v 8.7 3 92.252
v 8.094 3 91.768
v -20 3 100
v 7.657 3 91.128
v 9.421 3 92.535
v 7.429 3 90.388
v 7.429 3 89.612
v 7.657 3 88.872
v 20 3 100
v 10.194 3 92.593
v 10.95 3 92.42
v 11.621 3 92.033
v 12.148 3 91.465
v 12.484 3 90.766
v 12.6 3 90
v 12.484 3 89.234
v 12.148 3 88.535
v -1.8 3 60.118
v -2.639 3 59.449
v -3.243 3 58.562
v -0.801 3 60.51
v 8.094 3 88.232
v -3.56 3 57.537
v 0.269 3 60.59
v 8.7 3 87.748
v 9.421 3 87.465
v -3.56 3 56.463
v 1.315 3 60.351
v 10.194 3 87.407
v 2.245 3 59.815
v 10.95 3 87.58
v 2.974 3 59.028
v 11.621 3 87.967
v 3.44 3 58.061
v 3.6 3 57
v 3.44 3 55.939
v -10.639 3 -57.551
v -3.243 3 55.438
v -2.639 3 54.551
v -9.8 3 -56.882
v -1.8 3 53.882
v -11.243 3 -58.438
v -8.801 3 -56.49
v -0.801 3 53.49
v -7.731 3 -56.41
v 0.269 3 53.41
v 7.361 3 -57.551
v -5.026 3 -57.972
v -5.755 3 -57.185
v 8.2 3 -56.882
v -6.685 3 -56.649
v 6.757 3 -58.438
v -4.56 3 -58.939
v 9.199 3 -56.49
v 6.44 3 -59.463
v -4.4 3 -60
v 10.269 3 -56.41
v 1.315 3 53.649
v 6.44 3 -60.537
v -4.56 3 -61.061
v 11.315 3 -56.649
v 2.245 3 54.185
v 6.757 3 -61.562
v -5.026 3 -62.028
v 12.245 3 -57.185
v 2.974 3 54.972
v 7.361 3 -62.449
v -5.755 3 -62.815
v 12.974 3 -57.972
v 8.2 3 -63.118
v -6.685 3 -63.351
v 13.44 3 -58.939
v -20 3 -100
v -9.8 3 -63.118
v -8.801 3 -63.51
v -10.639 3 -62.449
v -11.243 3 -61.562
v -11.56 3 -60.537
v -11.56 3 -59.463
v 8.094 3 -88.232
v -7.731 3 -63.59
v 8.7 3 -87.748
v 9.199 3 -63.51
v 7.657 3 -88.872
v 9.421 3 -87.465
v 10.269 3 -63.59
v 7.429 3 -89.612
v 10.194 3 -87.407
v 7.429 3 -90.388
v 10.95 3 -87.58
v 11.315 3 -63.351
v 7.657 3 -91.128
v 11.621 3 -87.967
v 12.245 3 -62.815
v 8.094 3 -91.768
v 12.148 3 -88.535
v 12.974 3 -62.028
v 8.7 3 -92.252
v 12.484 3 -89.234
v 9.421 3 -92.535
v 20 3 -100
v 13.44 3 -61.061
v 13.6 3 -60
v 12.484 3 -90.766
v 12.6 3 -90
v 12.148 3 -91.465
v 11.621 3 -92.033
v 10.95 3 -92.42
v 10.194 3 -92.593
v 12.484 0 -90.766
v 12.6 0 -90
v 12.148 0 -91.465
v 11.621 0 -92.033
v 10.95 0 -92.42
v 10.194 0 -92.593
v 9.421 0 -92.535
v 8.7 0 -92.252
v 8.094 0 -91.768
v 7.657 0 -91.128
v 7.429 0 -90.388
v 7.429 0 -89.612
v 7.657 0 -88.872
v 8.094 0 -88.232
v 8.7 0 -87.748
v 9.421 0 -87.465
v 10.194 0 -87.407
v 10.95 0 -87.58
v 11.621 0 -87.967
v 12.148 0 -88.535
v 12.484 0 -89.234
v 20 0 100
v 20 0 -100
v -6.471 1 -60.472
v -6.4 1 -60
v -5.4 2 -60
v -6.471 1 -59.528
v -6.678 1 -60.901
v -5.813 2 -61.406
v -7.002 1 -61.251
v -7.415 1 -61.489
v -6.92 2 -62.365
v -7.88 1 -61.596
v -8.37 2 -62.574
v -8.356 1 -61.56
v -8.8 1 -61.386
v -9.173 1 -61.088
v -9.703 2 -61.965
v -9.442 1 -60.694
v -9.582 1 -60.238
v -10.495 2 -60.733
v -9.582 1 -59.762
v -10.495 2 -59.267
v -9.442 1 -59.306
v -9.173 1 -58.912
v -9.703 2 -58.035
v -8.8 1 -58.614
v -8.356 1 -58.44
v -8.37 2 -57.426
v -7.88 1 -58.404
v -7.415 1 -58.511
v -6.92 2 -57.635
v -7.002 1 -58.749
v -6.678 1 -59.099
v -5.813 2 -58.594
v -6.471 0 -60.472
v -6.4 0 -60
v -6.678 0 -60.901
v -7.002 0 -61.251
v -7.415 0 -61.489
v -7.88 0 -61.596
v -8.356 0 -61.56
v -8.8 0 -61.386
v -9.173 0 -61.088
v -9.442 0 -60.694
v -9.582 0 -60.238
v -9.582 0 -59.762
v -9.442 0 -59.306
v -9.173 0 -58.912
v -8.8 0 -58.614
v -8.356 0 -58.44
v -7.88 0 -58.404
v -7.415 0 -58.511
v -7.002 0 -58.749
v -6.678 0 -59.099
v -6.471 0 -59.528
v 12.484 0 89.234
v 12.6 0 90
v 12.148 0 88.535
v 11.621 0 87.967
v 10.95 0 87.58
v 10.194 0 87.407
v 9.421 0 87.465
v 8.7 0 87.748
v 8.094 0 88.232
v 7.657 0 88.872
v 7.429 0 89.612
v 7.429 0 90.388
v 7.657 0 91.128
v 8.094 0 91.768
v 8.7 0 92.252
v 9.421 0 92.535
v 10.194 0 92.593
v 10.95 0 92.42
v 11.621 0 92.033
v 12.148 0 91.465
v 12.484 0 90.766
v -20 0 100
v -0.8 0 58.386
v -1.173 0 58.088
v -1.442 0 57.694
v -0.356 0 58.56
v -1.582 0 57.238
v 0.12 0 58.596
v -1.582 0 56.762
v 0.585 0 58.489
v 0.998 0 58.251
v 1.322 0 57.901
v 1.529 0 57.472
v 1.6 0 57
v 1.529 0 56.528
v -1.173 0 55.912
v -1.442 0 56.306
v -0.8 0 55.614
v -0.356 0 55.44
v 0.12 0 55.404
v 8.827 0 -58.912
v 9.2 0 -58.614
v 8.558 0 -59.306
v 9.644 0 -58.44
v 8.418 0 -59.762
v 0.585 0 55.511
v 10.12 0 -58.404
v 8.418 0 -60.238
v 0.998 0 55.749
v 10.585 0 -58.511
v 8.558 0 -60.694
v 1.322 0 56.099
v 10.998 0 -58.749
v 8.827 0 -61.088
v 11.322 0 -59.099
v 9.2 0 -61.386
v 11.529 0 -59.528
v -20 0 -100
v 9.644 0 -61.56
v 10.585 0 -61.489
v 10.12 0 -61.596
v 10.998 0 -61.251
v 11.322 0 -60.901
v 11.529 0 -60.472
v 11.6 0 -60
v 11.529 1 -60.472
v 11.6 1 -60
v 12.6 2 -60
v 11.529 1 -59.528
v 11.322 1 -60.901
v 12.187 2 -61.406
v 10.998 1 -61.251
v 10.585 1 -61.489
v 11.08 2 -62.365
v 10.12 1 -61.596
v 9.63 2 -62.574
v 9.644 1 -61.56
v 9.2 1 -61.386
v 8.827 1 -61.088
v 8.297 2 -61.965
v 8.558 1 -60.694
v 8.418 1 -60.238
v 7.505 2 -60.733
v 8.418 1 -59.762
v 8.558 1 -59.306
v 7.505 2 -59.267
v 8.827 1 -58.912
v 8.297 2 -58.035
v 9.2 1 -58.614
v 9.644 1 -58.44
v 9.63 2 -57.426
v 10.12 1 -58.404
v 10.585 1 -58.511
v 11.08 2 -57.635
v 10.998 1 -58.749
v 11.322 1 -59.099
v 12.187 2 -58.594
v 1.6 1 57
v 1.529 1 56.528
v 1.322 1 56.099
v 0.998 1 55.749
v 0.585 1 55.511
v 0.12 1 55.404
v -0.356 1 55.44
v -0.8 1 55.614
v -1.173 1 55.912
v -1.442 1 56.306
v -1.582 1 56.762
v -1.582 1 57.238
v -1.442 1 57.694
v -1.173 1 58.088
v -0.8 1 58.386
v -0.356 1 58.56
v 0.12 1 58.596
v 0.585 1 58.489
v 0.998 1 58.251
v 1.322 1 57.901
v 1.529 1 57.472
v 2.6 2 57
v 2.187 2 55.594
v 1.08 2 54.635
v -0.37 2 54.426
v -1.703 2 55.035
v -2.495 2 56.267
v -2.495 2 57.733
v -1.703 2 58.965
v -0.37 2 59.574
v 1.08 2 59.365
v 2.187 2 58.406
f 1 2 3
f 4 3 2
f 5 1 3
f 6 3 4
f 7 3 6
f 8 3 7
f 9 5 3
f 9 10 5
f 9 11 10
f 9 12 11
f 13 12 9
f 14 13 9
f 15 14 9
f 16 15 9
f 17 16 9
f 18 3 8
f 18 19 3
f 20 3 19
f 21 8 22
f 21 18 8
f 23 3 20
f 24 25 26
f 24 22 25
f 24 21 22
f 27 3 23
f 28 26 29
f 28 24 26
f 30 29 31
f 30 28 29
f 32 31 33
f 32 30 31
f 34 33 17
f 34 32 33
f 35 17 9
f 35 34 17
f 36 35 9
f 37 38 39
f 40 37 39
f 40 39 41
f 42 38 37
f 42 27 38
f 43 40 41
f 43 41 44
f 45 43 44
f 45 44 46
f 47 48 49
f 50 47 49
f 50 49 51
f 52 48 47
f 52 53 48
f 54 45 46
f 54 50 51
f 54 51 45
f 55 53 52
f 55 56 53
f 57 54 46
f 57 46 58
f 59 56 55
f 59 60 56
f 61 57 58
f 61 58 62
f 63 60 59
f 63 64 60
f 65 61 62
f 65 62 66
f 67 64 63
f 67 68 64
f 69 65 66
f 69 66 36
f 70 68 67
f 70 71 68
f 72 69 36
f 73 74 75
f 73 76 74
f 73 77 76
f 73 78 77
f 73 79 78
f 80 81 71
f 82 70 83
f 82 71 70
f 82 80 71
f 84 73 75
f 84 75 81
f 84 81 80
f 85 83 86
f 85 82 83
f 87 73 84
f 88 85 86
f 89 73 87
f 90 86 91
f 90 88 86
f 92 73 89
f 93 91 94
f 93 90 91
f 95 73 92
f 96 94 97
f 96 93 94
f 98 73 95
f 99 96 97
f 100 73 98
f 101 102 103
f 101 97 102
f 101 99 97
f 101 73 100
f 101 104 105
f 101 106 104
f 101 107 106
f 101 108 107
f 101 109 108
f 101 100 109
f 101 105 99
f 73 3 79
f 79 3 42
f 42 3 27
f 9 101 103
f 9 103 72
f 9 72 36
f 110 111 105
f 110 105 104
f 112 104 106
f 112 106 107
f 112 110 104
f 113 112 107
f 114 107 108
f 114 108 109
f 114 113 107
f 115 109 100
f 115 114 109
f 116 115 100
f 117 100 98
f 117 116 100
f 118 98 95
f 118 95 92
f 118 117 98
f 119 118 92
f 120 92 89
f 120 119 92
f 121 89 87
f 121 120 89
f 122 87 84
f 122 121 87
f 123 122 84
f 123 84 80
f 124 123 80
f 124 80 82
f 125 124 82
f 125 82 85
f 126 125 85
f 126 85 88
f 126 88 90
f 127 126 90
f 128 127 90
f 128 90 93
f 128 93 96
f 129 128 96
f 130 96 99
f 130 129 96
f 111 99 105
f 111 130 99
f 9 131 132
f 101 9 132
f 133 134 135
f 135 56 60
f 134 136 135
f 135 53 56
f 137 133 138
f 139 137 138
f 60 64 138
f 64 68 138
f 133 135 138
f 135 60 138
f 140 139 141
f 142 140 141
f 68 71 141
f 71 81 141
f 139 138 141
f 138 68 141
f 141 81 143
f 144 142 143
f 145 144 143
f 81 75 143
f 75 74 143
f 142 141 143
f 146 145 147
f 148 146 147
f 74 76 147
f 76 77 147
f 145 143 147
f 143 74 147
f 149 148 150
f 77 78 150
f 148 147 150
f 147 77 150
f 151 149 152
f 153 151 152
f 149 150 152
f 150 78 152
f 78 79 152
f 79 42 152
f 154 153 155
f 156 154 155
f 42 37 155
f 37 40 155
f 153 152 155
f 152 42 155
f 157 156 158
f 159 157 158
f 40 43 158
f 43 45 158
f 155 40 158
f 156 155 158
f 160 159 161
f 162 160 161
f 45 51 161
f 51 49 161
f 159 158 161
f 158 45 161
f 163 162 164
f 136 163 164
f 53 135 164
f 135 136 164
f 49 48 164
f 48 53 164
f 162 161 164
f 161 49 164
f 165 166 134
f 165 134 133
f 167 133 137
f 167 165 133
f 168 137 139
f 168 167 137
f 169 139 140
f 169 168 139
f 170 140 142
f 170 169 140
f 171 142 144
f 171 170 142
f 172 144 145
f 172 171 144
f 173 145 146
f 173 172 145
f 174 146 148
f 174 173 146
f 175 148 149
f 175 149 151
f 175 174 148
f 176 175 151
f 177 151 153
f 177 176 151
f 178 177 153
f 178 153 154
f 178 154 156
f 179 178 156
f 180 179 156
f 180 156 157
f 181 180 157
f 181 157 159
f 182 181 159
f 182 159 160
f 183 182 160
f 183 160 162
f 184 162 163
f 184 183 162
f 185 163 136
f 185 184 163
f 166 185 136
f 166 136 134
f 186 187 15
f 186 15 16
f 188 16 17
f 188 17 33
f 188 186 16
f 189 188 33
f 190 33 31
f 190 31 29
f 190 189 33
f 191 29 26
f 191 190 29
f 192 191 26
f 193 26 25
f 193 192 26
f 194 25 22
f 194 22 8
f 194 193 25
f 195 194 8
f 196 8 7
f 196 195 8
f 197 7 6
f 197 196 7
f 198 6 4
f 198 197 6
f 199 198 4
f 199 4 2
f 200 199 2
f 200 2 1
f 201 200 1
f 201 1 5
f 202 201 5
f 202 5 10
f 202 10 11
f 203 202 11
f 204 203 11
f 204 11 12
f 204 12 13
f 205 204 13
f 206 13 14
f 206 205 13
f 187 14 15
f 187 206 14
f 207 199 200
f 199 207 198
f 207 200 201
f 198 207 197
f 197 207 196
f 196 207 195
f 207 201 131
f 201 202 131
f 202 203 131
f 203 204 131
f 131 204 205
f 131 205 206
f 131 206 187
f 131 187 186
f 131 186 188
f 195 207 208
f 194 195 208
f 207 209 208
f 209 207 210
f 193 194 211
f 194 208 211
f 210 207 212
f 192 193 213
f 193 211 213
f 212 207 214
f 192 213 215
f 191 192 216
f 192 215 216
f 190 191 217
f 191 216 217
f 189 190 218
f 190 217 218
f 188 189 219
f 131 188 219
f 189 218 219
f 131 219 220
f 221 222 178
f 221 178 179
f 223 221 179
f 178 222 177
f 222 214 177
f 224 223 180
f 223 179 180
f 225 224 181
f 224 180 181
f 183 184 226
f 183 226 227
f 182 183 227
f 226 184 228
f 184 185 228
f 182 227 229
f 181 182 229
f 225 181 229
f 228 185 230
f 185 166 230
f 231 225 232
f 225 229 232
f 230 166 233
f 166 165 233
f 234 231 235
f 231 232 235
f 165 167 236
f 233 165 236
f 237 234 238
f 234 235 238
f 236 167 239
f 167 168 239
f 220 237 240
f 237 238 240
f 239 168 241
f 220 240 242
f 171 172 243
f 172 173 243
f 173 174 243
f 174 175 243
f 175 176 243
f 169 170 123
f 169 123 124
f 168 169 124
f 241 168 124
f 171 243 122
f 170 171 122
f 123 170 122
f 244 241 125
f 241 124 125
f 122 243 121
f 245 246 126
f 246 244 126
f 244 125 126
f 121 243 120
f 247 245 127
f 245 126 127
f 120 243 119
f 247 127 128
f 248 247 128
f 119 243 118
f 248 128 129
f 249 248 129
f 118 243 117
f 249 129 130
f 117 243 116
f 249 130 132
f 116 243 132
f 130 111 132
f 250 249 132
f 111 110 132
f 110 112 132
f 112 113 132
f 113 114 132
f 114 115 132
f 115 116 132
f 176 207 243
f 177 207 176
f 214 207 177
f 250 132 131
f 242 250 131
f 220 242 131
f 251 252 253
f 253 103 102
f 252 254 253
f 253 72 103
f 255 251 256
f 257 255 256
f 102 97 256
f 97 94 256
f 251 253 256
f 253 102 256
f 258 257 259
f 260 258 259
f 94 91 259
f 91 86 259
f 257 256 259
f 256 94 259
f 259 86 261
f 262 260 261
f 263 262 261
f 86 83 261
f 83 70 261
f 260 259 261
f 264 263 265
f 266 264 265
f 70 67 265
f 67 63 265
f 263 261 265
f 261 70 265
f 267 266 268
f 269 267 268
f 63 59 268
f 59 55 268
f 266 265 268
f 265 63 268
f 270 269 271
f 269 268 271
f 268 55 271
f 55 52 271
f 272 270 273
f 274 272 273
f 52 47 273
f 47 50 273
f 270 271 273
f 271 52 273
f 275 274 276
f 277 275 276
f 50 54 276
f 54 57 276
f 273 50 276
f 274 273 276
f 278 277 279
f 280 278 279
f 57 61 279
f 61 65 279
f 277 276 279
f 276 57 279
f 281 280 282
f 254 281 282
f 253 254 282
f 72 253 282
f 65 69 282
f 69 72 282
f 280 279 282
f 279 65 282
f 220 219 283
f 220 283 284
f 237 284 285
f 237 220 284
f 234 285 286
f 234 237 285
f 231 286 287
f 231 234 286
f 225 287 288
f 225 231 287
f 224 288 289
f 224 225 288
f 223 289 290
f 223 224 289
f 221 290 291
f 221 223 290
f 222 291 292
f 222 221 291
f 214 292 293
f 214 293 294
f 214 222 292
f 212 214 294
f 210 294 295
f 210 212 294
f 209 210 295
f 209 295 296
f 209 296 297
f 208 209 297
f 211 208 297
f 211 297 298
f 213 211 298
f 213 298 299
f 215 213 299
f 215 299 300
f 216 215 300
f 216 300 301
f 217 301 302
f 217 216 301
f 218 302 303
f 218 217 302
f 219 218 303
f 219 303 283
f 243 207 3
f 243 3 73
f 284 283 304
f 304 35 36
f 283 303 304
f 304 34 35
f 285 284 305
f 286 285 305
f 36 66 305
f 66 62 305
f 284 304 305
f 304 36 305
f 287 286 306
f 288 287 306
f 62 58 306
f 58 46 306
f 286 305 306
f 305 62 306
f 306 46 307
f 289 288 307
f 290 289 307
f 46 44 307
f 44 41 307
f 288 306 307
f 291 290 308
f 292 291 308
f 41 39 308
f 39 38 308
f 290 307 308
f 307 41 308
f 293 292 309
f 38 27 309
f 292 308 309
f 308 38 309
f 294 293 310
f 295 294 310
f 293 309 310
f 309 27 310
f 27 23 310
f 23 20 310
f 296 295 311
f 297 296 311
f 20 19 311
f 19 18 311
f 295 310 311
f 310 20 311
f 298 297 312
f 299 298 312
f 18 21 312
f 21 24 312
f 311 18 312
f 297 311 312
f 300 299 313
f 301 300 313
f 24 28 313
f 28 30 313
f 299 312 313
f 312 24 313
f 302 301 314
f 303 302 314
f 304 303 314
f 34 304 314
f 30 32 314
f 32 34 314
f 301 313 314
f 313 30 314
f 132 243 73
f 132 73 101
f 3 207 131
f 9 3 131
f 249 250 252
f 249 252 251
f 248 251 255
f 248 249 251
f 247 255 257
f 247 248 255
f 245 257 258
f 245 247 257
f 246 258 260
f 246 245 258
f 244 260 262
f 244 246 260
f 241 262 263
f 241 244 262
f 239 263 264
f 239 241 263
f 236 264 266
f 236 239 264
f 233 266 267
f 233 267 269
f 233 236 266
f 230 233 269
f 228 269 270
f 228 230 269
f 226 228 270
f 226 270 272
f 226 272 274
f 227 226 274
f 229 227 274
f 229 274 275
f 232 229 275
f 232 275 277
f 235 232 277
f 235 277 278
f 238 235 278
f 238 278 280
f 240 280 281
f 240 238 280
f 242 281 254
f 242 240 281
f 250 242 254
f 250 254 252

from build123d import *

# Parameters (mm, degrees)
SKETCH1_W           = 40
SKETCH1_H           = 200
SKETCH1_R           = 2.6
SKETCH1_R_2         = 1.6
BOSS_EXTRUDE1_DEPTH = 3
CHAMFER1_SIZE       = 2


with BuildPart() as part:
    # Sketch1 → Boss-Extrude1 (new body)
    with BuildSketch(Plane(origin=(0, 0, 0), x_dir=(1, 0, 0), z_dir=(0, 1, 0))):
        Rectangle(SKETCH1_W, SKETCH1_H)
        with Locations((10, -90)):
            Circle(SKETCH1_R, mode=Mode.SUBTRACT)
        with Locations((10, 90)):
            Circle(SKETCH1_R, mode=Mode.SUBTRACT)
        with Locations((10, 60)):
            Circle(SKETCH1_R_2, mode=Mode.SUBTRACT)
        with Locations((-8, 60)):
            Circle(SKETCH1_R_2, mode=Mode.SUBTRACT)
        with Locations((0, -57)):
            Circle(SKETCH1_R_2, mode=Mode.SUBTRACT)
    extrude(amount=BOSS_EXTRUDE1_DEPTH)

    # Chamfer1
    chamfer1_edges = [part.edges().sort_by_distance(p)[0] for p in [
        (8.4, 3, -60),
        (-9.6, 3, -60),
        (-1.6, 3, 57),
    ]]
    chamfer(chamfer1_edges, length=CHAMFER1_SIZE)


solid = part.part
